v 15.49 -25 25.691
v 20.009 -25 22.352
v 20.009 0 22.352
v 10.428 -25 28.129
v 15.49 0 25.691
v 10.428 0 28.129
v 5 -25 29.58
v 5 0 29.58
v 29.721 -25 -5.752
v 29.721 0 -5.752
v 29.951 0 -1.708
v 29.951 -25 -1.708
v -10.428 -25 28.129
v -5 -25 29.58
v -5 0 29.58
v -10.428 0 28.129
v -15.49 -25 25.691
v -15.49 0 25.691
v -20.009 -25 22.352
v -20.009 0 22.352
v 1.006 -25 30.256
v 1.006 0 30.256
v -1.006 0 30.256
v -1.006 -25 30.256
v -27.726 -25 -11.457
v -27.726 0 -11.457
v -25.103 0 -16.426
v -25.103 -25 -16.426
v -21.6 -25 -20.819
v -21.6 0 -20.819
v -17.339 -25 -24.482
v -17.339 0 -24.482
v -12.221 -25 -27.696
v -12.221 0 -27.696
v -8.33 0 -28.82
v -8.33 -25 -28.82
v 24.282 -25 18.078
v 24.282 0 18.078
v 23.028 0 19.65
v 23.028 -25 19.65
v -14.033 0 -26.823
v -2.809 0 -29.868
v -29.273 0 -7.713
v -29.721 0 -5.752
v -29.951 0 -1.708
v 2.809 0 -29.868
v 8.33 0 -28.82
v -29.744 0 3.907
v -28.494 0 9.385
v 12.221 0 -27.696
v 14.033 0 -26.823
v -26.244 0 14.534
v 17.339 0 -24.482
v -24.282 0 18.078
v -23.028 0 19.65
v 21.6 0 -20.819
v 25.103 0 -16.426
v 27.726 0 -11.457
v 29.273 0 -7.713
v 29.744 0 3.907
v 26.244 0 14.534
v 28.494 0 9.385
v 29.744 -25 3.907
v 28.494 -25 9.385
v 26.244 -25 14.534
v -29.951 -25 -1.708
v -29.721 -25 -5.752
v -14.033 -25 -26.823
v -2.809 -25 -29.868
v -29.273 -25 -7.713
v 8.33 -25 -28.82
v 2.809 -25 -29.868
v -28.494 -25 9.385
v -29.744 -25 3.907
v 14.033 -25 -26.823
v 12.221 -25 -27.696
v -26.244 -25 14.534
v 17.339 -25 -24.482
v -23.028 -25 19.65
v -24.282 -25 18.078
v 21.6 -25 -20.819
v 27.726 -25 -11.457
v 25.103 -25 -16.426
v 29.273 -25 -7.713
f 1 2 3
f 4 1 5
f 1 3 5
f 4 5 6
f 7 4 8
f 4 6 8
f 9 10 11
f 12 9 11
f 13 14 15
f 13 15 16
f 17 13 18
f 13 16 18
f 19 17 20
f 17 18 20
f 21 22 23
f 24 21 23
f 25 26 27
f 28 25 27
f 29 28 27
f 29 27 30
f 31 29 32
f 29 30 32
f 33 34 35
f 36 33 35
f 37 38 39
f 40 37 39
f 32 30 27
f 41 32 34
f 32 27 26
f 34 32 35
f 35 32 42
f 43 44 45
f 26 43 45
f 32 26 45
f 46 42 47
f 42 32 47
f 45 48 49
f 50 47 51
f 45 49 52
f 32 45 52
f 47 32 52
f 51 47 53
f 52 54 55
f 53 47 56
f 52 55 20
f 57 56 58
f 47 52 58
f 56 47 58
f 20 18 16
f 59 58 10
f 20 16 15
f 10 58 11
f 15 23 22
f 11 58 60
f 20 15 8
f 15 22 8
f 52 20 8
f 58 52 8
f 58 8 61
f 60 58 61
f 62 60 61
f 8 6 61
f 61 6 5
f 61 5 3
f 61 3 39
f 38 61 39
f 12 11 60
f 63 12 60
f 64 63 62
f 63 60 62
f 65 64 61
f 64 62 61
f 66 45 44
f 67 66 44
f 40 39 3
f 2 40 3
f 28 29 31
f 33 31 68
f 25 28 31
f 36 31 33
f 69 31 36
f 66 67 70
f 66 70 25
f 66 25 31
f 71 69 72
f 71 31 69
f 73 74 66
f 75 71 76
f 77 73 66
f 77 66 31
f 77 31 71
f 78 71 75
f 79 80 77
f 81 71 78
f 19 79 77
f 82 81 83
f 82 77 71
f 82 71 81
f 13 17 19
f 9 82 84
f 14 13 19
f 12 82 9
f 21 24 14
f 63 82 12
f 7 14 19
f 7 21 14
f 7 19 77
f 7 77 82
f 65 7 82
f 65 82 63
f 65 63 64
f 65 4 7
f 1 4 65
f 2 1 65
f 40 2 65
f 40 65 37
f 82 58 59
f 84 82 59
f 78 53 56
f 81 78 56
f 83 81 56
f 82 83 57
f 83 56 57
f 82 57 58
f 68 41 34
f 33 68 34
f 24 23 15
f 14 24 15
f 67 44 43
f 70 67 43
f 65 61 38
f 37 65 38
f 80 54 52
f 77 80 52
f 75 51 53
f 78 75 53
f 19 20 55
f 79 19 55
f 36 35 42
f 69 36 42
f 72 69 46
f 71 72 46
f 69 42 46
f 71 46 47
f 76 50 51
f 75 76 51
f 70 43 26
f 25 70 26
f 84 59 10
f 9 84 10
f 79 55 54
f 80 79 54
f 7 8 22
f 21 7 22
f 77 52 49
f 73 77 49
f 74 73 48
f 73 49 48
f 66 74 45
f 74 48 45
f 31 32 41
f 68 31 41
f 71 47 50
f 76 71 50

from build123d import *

# Parameters (mm, degrees)
F5_DEPTH = 25
F6_DEPTH = 25
F7_COUNT = 7


with BuildPart() as f5:
    # F3 (on Front) → F5 (new body)
    with BuildSketch(Plane.XZ):
        with BuildLine():
            ThreePointArc((-5, 29.5803989155), (-19.364916731, -22.9128784748), (30, 0))
            ThreePointArc((30, 0), (22.9128784748, 19.364916731), (5, 29.5803989155))
            ThreePointArc((5, 29.5803989155), (0, 30), (-5, 29.5803989155))
        make_face()
    extrude(amount=F5_DEPTH)



with BuildPart() as f6:
    # F3 (on Front) → F6 (new body)
    with BuildSketch(Plane.XZ):
        with BuildLine():
            ThreePointArc((-5, 29.5803989155), (0, 30), (5, 29.5803989155))
            Line((5, 29.5803989155), (1.0056277868, 30.2555710497))
            Line((1.0056277868, 30.2555710497), (0, 30.2555710497))
            Line((0, 30.2555710497), (-1.0056277868, 30.2555710497))
            Line((-1.0056277868, 30.2555710497), (-5, 29.5803989155))
        make_face()
    extrude(amount=F6_DEPTH)


with BuildPart() as f5_1:
    add(f5.part)

    add(f6.part)  # F7 merges F6
    # F7: F6, F5 ×7 about axis
    f7_axis = Axis((0, 33.5468817502, 0), (0, 1, 0))
    for i in range(1, F7_COUNT):
        add(f6.part.rotate(f7_axis, i * 360 / F7_COUNT))
        add(f5.part.rotate(f7_axis, i * 360 / F7_COUNT))


solid = f5_1.part
